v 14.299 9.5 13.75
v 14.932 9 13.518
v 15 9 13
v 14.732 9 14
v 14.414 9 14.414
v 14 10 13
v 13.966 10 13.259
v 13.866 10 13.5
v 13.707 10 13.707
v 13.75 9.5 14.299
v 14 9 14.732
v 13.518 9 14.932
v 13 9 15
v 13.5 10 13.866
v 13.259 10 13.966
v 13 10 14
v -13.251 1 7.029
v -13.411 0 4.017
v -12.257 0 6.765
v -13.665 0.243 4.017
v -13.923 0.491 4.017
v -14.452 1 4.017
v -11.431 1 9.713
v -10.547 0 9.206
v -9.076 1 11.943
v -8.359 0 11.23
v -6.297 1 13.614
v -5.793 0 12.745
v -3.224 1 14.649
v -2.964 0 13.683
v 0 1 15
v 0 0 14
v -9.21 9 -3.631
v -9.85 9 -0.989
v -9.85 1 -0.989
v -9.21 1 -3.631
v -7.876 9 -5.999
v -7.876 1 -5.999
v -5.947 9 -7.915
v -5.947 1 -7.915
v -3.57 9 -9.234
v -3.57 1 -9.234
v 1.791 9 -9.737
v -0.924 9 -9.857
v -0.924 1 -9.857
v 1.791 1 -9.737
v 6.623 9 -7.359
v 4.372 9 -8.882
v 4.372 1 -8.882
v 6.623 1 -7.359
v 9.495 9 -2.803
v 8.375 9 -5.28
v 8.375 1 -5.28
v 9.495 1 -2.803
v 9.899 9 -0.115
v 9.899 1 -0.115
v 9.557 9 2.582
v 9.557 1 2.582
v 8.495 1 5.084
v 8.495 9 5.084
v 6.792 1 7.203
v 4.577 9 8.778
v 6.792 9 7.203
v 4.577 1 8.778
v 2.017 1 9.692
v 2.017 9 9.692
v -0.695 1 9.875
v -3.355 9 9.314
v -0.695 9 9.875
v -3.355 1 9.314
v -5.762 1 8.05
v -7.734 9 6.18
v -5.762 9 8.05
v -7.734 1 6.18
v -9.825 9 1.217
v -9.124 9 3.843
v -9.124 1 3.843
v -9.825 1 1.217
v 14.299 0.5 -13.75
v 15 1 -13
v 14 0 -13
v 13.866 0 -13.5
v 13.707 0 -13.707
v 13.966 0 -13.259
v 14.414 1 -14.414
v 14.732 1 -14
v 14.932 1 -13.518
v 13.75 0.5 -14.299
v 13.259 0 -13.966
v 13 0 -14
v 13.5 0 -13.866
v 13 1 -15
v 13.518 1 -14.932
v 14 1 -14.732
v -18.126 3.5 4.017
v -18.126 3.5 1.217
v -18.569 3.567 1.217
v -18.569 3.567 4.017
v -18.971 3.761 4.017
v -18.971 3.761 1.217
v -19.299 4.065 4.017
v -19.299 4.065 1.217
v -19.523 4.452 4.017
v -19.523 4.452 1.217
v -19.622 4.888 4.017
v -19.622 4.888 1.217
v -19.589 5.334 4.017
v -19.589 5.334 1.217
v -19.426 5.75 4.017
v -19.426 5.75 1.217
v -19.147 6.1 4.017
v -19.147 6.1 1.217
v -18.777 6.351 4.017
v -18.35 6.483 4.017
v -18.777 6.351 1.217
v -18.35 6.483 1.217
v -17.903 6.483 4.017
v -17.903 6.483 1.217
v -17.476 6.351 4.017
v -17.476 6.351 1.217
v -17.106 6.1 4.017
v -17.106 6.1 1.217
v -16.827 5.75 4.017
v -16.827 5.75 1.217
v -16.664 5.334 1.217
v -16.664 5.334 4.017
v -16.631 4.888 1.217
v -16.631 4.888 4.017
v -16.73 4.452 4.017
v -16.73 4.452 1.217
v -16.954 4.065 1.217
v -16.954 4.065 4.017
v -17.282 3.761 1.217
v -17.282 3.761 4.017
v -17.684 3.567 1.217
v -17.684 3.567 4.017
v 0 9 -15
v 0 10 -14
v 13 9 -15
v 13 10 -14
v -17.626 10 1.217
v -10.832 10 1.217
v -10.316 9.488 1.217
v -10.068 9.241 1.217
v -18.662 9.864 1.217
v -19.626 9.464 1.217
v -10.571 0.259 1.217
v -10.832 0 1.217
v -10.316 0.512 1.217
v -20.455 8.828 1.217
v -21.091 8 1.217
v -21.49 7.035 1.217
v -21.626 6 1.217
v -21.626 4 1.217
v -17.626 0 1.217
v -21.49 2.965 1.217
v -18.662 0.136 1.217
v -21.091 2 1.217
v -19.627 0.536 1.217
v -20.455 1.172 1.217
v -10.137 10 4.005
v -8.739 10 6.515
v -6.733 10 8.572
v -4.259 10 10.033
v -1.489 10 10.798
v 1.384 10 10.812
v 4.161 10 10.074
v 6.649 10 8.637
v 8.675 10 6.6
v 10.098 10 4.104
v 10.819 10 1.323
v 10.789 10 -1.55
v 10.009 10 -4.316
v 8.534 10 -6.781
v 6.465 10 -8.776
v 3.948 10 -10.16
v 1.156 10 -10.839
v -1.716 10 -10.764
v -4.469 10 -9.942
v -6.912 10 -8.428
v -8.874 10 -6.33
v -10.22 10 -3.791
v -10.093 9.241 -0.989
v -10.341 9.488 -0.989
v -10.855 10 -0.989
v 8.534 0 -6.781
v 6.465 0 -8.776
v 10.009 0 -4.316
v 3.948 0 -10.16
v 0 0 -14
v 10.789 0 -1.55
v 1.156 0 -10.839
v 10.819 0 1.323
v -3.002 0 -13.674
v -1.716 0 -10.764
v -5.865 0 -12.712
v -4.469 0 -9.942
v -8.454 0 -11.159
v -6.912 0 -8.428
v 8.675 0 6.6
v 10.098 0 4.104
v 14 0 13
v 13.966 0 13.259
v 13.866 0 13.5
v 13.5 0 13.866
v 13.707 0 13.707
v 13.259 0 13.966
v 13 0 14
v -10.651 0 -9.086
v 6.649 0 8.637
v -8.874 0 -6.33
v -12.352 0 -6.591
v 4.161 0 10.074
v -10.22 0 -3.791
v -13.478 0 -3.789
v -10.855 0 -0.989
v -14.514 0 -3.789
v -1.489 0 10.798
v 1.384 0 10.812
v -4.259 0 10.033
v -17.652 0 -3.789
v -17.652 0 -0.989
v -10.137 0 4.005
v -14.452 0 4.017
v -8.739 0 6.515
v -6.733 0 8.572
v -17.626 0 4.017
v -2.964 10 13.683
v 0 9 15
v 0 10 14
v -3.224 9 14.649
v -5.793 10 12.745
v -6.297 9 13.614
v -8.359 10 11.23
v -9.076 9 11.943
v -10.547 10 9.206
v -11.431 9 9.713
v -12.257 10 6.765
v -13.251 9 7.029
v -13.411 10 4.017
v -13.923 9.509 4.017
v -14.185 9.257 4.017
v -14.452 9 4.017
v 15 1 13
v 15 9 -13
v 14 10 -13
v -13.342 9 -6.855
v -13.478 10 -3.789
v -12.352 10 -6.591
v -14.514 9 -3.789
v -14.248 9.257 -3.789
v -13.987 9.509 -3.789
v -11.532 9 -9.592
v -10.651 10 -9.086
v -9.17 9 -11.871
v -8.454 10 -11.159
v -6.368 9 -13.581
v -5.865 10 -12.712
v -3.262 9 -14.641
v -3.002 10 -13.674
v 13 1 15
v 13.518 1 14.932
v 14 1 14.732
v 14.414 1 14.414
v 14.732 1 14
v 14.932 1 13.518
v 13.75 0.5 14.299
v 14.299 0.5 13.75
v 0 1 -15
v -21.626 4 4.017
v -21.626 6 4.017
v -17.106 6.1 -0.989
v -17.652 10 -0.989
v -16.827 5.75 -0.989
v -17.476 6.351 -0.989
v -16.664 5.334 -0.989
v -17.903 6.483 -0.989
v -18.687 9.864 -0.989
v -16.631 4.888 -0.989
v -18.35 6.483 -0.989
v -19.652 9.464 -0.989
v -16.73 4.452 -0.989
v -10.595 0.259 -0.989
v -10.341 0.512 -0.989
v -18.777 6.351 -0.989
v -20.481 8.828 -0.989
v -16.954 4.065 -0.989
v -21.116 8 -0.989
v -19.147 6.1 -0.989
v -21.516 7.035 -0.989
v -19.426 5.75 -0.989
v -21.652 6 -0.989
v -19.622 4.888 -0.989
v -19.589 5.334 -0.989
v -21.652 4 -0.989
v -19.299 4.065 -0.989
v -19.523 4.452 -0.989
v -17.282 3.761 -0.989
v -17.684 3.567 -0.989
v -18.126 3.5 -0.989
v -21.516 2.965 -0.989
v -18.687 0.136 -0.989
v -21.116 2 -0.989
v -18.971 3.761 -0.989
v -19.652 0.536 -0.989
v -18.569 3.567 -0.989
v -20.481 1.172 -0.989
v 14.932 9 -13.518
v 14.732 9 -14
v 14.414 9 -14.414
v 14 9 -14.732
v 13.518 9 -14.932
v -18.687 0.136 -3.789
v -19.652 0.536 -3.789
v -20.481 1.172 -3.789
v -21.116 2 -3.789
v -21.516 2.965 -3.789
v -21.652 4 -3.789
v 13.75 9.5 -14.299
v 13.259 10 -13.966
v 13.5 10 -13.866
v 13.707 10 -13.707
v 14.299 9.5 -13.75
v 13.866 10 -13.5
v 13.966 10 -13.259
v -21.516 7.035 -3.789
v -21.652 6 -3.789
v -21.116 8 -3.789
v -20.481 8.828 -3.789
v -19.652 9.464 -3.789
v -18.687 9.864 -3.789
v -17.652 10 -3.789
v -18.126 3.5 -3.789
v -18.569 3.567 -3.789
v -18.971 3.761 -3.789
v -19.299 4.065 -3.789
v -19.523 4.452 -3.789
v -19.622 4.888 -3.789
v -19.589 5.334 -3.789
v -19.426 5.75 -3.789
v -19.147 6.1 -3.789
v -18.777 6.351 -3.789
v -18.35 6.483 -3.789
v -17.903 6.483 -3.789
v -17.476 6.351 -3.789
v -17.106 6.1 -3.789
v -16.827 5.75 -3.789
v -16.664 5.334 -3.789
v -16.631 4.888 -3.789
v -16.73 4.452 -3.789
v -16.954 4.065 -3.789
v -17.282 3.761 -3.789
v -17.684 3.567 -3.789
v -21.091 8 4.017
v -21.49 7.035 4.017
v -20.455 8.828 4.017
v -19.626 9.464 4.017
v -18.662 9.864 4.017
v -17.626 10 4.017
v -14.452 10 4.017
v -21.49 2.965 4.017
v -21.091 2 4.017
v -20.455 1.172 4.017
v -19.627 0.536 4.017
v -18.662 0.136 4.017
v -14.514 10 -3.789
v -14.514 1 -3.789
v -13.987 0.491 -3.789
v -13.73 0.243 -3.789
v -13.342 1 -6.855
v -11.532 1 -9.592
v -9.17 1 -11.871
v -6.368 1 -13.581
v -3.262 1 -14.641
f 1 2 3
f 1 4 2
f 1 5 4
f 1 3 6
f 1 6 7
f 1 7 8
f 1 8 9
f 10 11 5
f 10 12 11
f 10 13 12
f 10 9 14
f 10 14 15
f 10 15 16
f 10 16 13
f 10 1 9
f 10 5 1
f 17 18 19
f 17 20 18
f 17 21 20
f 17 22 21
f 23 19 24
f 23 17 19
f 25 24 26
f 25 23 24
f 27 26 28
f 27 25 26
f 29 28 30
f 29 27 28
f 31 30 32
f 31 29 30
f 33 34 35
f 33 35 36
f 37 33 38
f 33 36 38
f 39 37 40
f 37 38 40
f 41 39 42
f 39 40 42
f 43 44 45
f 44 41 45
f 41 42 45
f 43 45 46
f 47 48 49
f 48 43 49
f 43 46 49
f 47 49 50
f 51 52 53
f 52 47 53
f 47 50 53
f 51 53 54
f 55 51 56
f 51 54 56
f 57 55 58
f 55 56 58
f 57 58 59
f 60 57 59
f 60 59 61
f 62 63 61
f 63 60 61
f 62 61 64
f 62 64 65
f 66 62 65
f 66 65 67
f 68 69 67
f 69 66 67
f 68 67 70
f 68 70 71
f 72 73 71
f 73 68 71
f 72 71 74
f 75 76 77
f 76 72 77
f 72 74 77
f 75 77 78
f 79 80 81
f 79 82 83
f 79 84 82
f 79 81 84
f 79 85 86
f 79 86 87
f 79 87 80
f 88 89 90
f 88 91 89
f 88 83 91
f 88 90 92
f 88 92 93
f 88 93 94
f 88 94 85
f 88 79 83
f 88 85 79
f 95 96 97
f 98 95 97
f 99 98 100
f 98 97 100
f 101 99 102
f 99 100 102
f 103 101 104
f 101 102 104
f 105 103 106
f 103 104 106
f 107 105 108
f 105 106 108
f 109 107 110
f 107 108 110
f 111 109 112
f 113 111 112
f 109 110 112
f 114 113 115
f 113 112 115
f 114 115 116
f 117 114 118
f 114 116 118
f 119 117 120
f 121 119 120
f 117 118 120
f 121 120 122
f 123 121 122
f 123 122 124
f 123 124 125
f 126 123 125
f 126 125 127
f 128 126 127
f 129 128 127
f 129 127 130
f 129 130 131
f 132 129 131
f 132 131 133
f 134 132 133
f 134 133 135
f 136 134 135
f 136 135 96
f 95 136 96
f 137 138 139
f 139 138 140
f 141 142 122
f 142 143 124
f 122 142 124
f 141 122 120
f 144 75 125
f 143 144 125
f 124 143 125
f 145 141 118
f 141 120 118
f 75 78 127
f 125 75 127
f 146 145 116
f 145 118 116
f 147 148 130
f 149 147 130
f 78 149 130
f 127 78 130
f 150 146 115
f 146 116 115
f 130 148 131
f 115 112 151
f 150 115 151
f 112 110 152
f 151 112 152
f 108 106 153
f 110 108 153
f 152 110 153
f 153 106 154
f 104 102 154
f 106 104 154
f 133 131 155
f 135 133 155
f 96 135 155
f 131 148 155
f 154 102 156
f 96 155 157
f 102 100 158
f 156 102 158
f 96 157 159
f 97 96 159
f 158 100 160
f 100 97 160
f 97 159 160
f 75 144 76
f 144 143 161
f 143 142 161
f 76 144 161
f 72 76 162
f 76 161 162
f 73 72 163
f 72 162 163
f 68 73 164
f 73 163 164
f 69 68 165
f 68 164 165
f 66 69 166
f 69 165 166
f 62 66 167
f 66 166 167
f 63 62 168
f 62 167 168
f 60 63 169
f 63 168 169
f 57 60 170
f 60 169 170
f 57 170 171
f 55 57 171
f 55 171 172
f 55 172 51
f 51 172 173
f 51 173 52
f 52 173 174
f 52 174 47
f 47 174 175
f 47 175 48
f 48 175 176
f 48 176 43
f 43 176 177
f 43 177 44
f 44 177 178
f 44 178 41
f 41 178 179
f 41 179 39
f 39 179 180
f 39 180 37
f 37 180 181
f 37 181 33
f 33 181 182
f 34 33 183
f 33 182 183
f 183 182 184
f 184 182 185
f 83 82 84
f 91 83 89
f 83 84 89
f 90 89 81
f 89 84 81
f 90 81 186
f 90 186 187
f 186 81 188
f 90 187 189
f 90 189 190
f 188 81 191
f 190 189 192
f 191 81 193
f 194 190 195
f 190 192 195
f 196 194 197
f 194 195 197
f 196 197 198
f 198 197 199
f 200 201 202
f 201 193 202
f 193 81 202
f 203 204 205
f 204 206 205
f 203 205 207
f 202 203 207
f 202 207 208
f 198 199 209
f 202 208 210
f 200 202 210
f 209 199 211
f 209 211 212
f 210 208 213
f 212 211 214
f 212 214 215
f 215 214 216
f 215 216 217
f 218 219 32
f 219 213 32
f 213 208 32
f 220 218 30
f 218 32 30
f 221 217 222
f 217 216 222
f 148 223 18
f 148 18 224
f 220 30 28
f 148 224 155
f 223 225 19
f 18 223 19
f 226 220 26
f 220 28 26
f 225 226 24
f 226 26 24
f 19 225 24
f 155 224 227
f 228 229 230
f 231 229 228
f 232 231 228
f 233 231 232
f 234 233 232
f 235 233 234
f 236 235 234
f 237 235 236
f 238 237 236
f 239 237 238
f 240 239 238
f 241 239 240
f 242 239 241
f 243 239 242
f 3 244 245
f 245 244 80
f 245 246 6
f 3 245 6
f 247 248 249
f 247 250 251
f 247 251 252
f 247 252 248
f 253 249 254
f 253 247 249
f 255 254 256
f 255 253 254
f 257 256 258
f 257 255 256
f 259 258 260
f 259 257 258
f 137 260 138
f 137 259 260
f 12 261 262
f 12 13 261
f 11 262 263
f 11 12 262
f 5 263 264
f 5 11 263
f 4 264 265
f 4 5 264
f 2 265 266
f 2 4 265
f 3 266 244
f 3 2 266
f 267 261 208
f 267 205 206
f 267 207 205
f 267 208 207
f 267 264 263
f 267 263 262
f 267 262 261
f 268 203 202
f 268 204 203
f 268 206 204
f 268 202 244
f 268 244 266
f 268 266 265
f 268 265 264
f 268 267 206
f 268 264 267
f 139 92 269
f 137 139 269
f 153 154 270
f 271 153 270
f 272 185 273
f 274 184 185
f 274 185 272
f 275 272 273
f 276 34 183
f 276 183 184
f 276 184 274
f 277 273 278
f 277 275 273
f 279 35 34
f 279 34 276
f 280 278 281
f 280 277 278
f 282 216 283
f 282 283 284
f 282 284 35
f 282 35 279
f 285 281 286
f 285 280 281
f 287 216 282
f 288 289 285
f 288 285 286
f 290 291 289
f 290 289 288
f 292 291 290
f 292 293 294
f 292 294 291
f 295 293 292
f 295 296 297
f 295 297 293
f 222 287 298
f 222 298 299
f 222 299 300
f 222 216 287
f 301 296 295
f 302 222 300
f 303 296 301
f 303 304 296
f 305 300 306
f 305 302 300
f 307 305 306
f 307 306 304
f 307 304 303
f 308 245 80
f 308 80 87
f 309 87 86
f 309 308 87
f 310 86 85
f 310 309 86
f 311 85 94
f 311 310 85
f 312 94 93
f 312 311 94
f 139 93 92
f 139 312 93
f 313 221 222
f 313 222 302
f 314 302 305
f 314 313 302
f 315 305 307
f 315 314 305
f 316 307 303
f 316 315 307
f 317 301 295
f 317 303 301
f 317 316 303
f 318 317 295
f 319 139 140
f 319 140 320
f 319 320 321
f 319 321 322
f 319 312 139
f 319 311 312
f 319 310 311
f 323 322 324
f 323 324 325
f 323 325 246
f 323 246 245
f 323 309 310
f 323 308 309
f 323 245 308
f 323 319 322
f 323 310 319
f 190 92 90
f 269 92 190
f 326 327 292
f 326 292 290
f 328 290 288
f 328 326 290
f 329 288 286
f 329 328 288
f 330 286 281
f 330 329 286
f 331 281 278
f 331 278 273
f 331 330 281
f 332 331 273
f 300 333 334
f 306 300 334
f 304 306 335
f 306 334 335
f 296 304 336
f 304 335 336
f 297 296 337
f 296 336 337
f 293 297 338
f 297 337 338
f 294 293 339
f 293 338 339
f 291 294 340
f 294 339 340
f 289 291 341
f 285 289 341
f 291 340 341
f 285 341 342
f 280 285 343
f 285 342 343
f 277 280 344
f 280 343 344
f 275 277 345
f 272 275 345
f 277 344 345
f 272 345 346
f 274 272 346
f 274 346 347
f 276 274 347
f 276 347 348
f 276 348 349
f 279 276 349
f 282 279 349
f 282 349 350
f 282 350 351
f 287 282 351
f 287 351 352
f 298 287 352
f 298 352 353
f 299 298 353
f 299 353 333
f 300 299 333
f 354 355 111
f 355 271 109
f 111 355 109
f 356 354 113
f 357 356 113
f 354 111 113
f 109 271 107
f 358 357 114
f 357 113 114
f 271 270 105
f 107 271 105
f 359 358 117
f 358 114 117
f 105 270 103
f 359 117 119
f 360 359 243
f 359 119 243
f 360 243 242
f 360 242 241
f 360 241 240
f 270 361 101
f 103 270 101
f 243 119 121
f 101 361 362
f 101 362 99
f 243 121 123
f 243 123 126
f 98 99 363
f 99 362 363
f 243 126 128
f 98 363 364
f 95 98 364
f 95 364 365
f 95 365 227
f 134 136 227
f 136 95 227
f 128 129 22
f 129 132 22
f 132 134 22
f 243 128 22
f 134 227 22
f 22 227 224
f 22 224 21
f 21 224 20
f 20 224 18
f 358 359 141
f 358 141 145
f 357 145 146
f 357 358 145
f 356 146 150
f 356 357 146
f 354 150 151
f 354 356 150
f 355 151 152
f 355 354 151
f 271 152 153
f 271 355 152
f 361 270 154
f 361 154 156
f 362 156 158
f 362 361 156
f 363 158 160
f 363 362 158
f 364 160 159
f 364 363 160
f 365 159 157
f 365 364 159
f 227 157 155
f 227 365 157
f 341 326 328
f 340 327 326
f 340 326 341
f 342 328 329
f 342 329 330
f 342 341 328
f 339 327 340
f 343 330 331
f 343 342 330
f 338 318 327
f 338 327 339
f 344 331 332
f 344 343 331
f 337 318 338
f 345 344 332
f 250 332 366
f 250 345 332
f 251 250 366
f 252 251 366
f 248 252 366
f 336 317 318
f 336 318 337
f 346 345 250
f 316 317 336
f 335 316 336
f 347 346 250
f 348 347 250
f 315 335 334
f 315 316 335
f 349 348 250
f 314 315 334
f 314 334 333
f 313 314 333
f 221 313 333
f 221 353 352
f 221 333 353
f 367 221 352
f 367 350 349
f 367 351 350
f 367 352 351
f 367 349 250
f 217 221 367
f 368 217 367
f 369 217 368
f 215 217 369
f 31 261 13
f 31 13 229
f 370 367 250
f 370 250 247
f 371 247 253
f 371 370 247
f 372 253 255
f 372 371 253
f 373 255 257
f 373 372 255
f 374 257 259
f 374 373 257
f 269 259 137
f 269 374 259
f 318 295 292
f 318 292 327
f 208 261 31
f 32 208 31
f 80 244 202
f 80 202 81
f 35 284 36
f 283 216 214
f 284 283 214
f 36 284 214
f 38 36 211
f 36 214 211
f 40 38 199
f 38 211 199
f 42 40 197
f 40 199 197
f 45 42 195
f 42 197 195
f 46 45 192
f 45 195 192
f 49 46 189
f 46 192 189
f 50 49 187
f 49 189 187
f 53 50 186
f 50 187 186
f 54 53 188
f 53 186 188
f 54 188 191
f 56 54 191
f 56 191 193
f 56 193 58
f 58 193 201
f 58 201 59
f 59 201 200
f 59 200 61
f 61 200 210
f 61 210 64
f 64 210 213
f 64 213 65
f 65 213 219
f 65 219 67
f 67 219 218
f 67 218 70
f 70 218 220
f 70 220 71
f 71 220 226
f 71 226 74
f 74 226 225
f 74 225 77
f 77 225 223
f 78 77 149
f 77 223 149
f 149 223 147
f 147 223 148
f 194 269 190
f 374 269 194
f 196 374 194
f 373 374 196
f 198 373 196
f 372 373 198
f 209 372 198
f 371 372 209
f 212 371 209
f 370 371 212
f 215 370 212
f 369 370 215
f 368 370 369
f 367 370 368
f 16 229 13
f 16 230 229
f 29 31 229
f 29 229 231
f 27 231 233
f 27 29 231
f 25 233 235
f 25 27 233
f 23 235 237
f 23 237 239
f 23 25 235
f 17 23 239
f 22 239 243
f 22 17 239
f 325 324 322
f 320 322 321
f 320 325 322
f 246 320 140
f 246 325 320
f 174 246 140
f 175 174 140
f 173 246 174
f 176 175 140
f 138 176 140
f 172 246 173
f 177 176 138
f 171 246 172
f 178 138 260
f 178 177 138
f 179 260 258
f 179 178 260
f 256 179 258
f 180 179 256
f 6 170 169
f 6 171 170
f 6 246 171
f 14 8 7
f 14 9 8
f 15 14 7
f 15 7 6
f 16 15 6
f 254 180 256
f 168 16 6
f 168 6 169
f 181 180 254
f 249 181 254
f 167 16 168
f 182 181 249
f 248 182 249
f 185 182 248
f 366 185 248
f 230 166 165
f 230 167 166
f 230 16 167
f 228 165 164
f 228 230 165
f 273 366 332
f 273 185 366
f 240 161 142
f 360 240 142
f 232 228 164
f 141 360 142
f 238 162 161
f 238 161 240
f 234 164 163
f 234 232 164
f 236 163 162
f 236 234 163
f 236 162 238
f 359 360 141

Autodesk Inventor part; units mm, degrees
ref_plane "YZ Plane" through (0, 0, 0) normal (1, 0, 0) x (0, 1, 0)
ref_plane "XZ Plane" through (0, 0, 0) normal (0, 1, 0) x (-1, 0, 0)
ref_plane "XY Plane" through (0, 0, 0) normal (0, 0, 1) x (1, 0, 0)
sketch "Эскиз1" plane through (0, 0, 0) normal (0, 1, 0) x (-1, 0, 0)
  arc A0 (9.8249, 1.217) -> (9.8505, -0.9889) centre (0, 0) ccw
  line L0 (-15.0002, 15) -> (-15.0002, -15)
  line L1 (-15.0002, 15) -> (0, 15)
  line L2 (-15.0002, -15) -> (0, -15)
  line L3 (9.8249, 1.217) -> (16.2051, 1.217)
  line L4 (13.6718, -0.9889) -> (9.8505, -0.9889)
  arc A1 (0, -15) -> (14.5136, -3.7889) centre (0, 0) ccw
  arc A2 (14.4521, 4.017) -> (0, 15) centre (0, 0) ccw
  line L5 (9.8505, -0.9889) -> (21.6521, -0.9889)
  line L6 (21.6521, -0.9889) -> (21.6521, -3.7889)
  line L7 (21.6521, -3.7889) -> (14.5136, -3.7889)
  line L8 (9.8249, 1.217) -> (21.6265, 1.217)
  line L9 (21.6265, 1.217) -> (21.6265, 4.017)
  line L10 (21.6265, 4.017) -> (14.4521, 4.017)
  point P0 (15, 0)
  dimension "d0" = 19.8
  dimension "d2" = 30
  dimension "d5" = 2.8
  dimension "d6" = 2.8
extrude "Выдавливание1" add sketch "Эскиз1" along normal blind 10
fillet "Сопряжение1" radius 4 4 edges at (-21.6265, 10, 2.617) (-21.6521, 10, -2.3889) (-21.6265, 0, 2.617) (-21.6521, 0, -2.3889)
sketch "Эскиз3" plane through (-14.4521, 0, 4.017) normal (0, 0, 1) x (1, 0, 0)
  arc A0 (-7.1744, 4) -> (-3.1744, 0) centre (-3.1744, 4) ccw projected
  line L0 (-3.1744, 0) -> (0, 0) projected
  line L1 (0, 0) -> (0, 10) projected
  line L2 (-3.1744, 10) -> (0, 10) projected
  arc A1 (-3.1744, 10) -> (-7.1744, 6) centre (-3.1744, 6) ccw projected
  line L3 (-7.1744, 4) -> (-7.1744, 6) projected
  line L4 (-7.1744, 5) -> (-3.6744, 5) construction
  point P0 (14.4521, 0)
  dimension "d20" = 3.5
hole "Отверстие2" at (-18.1265, 5, 4.017) direction (0, 0, -1) diameter 3 depth 8 tip angle 118
fillet "Сопряжение2" radius 2 2 edges at (15.0002, 5, 15) (15.0002, 5, -15)
chamfer "Фаска1" distance 1 angle 45 16 edges at (9.8993, 10, -0.1148) (9.8993, 0, -0.1148) (6.5001, 10, 15) (14.4144, 10, 14.4142) (15.0002, 10, 0) (14.4144, 10, -14.4142) (6.5001, 10, -15) (-9.1697, 10, -11.8708) (-9.0759, 10, 11.9427) (6.5001, 0, 15) (14.4144, 0, 14.4142) (15.0002, 0, 0) (14.4144, 0, -14.4142) (6.5001, 0, -15) (-9.1697, 0, -11.8708) (-9.0759, 0, 11.9427)
properties part number "BasicMount 19.5mm"
